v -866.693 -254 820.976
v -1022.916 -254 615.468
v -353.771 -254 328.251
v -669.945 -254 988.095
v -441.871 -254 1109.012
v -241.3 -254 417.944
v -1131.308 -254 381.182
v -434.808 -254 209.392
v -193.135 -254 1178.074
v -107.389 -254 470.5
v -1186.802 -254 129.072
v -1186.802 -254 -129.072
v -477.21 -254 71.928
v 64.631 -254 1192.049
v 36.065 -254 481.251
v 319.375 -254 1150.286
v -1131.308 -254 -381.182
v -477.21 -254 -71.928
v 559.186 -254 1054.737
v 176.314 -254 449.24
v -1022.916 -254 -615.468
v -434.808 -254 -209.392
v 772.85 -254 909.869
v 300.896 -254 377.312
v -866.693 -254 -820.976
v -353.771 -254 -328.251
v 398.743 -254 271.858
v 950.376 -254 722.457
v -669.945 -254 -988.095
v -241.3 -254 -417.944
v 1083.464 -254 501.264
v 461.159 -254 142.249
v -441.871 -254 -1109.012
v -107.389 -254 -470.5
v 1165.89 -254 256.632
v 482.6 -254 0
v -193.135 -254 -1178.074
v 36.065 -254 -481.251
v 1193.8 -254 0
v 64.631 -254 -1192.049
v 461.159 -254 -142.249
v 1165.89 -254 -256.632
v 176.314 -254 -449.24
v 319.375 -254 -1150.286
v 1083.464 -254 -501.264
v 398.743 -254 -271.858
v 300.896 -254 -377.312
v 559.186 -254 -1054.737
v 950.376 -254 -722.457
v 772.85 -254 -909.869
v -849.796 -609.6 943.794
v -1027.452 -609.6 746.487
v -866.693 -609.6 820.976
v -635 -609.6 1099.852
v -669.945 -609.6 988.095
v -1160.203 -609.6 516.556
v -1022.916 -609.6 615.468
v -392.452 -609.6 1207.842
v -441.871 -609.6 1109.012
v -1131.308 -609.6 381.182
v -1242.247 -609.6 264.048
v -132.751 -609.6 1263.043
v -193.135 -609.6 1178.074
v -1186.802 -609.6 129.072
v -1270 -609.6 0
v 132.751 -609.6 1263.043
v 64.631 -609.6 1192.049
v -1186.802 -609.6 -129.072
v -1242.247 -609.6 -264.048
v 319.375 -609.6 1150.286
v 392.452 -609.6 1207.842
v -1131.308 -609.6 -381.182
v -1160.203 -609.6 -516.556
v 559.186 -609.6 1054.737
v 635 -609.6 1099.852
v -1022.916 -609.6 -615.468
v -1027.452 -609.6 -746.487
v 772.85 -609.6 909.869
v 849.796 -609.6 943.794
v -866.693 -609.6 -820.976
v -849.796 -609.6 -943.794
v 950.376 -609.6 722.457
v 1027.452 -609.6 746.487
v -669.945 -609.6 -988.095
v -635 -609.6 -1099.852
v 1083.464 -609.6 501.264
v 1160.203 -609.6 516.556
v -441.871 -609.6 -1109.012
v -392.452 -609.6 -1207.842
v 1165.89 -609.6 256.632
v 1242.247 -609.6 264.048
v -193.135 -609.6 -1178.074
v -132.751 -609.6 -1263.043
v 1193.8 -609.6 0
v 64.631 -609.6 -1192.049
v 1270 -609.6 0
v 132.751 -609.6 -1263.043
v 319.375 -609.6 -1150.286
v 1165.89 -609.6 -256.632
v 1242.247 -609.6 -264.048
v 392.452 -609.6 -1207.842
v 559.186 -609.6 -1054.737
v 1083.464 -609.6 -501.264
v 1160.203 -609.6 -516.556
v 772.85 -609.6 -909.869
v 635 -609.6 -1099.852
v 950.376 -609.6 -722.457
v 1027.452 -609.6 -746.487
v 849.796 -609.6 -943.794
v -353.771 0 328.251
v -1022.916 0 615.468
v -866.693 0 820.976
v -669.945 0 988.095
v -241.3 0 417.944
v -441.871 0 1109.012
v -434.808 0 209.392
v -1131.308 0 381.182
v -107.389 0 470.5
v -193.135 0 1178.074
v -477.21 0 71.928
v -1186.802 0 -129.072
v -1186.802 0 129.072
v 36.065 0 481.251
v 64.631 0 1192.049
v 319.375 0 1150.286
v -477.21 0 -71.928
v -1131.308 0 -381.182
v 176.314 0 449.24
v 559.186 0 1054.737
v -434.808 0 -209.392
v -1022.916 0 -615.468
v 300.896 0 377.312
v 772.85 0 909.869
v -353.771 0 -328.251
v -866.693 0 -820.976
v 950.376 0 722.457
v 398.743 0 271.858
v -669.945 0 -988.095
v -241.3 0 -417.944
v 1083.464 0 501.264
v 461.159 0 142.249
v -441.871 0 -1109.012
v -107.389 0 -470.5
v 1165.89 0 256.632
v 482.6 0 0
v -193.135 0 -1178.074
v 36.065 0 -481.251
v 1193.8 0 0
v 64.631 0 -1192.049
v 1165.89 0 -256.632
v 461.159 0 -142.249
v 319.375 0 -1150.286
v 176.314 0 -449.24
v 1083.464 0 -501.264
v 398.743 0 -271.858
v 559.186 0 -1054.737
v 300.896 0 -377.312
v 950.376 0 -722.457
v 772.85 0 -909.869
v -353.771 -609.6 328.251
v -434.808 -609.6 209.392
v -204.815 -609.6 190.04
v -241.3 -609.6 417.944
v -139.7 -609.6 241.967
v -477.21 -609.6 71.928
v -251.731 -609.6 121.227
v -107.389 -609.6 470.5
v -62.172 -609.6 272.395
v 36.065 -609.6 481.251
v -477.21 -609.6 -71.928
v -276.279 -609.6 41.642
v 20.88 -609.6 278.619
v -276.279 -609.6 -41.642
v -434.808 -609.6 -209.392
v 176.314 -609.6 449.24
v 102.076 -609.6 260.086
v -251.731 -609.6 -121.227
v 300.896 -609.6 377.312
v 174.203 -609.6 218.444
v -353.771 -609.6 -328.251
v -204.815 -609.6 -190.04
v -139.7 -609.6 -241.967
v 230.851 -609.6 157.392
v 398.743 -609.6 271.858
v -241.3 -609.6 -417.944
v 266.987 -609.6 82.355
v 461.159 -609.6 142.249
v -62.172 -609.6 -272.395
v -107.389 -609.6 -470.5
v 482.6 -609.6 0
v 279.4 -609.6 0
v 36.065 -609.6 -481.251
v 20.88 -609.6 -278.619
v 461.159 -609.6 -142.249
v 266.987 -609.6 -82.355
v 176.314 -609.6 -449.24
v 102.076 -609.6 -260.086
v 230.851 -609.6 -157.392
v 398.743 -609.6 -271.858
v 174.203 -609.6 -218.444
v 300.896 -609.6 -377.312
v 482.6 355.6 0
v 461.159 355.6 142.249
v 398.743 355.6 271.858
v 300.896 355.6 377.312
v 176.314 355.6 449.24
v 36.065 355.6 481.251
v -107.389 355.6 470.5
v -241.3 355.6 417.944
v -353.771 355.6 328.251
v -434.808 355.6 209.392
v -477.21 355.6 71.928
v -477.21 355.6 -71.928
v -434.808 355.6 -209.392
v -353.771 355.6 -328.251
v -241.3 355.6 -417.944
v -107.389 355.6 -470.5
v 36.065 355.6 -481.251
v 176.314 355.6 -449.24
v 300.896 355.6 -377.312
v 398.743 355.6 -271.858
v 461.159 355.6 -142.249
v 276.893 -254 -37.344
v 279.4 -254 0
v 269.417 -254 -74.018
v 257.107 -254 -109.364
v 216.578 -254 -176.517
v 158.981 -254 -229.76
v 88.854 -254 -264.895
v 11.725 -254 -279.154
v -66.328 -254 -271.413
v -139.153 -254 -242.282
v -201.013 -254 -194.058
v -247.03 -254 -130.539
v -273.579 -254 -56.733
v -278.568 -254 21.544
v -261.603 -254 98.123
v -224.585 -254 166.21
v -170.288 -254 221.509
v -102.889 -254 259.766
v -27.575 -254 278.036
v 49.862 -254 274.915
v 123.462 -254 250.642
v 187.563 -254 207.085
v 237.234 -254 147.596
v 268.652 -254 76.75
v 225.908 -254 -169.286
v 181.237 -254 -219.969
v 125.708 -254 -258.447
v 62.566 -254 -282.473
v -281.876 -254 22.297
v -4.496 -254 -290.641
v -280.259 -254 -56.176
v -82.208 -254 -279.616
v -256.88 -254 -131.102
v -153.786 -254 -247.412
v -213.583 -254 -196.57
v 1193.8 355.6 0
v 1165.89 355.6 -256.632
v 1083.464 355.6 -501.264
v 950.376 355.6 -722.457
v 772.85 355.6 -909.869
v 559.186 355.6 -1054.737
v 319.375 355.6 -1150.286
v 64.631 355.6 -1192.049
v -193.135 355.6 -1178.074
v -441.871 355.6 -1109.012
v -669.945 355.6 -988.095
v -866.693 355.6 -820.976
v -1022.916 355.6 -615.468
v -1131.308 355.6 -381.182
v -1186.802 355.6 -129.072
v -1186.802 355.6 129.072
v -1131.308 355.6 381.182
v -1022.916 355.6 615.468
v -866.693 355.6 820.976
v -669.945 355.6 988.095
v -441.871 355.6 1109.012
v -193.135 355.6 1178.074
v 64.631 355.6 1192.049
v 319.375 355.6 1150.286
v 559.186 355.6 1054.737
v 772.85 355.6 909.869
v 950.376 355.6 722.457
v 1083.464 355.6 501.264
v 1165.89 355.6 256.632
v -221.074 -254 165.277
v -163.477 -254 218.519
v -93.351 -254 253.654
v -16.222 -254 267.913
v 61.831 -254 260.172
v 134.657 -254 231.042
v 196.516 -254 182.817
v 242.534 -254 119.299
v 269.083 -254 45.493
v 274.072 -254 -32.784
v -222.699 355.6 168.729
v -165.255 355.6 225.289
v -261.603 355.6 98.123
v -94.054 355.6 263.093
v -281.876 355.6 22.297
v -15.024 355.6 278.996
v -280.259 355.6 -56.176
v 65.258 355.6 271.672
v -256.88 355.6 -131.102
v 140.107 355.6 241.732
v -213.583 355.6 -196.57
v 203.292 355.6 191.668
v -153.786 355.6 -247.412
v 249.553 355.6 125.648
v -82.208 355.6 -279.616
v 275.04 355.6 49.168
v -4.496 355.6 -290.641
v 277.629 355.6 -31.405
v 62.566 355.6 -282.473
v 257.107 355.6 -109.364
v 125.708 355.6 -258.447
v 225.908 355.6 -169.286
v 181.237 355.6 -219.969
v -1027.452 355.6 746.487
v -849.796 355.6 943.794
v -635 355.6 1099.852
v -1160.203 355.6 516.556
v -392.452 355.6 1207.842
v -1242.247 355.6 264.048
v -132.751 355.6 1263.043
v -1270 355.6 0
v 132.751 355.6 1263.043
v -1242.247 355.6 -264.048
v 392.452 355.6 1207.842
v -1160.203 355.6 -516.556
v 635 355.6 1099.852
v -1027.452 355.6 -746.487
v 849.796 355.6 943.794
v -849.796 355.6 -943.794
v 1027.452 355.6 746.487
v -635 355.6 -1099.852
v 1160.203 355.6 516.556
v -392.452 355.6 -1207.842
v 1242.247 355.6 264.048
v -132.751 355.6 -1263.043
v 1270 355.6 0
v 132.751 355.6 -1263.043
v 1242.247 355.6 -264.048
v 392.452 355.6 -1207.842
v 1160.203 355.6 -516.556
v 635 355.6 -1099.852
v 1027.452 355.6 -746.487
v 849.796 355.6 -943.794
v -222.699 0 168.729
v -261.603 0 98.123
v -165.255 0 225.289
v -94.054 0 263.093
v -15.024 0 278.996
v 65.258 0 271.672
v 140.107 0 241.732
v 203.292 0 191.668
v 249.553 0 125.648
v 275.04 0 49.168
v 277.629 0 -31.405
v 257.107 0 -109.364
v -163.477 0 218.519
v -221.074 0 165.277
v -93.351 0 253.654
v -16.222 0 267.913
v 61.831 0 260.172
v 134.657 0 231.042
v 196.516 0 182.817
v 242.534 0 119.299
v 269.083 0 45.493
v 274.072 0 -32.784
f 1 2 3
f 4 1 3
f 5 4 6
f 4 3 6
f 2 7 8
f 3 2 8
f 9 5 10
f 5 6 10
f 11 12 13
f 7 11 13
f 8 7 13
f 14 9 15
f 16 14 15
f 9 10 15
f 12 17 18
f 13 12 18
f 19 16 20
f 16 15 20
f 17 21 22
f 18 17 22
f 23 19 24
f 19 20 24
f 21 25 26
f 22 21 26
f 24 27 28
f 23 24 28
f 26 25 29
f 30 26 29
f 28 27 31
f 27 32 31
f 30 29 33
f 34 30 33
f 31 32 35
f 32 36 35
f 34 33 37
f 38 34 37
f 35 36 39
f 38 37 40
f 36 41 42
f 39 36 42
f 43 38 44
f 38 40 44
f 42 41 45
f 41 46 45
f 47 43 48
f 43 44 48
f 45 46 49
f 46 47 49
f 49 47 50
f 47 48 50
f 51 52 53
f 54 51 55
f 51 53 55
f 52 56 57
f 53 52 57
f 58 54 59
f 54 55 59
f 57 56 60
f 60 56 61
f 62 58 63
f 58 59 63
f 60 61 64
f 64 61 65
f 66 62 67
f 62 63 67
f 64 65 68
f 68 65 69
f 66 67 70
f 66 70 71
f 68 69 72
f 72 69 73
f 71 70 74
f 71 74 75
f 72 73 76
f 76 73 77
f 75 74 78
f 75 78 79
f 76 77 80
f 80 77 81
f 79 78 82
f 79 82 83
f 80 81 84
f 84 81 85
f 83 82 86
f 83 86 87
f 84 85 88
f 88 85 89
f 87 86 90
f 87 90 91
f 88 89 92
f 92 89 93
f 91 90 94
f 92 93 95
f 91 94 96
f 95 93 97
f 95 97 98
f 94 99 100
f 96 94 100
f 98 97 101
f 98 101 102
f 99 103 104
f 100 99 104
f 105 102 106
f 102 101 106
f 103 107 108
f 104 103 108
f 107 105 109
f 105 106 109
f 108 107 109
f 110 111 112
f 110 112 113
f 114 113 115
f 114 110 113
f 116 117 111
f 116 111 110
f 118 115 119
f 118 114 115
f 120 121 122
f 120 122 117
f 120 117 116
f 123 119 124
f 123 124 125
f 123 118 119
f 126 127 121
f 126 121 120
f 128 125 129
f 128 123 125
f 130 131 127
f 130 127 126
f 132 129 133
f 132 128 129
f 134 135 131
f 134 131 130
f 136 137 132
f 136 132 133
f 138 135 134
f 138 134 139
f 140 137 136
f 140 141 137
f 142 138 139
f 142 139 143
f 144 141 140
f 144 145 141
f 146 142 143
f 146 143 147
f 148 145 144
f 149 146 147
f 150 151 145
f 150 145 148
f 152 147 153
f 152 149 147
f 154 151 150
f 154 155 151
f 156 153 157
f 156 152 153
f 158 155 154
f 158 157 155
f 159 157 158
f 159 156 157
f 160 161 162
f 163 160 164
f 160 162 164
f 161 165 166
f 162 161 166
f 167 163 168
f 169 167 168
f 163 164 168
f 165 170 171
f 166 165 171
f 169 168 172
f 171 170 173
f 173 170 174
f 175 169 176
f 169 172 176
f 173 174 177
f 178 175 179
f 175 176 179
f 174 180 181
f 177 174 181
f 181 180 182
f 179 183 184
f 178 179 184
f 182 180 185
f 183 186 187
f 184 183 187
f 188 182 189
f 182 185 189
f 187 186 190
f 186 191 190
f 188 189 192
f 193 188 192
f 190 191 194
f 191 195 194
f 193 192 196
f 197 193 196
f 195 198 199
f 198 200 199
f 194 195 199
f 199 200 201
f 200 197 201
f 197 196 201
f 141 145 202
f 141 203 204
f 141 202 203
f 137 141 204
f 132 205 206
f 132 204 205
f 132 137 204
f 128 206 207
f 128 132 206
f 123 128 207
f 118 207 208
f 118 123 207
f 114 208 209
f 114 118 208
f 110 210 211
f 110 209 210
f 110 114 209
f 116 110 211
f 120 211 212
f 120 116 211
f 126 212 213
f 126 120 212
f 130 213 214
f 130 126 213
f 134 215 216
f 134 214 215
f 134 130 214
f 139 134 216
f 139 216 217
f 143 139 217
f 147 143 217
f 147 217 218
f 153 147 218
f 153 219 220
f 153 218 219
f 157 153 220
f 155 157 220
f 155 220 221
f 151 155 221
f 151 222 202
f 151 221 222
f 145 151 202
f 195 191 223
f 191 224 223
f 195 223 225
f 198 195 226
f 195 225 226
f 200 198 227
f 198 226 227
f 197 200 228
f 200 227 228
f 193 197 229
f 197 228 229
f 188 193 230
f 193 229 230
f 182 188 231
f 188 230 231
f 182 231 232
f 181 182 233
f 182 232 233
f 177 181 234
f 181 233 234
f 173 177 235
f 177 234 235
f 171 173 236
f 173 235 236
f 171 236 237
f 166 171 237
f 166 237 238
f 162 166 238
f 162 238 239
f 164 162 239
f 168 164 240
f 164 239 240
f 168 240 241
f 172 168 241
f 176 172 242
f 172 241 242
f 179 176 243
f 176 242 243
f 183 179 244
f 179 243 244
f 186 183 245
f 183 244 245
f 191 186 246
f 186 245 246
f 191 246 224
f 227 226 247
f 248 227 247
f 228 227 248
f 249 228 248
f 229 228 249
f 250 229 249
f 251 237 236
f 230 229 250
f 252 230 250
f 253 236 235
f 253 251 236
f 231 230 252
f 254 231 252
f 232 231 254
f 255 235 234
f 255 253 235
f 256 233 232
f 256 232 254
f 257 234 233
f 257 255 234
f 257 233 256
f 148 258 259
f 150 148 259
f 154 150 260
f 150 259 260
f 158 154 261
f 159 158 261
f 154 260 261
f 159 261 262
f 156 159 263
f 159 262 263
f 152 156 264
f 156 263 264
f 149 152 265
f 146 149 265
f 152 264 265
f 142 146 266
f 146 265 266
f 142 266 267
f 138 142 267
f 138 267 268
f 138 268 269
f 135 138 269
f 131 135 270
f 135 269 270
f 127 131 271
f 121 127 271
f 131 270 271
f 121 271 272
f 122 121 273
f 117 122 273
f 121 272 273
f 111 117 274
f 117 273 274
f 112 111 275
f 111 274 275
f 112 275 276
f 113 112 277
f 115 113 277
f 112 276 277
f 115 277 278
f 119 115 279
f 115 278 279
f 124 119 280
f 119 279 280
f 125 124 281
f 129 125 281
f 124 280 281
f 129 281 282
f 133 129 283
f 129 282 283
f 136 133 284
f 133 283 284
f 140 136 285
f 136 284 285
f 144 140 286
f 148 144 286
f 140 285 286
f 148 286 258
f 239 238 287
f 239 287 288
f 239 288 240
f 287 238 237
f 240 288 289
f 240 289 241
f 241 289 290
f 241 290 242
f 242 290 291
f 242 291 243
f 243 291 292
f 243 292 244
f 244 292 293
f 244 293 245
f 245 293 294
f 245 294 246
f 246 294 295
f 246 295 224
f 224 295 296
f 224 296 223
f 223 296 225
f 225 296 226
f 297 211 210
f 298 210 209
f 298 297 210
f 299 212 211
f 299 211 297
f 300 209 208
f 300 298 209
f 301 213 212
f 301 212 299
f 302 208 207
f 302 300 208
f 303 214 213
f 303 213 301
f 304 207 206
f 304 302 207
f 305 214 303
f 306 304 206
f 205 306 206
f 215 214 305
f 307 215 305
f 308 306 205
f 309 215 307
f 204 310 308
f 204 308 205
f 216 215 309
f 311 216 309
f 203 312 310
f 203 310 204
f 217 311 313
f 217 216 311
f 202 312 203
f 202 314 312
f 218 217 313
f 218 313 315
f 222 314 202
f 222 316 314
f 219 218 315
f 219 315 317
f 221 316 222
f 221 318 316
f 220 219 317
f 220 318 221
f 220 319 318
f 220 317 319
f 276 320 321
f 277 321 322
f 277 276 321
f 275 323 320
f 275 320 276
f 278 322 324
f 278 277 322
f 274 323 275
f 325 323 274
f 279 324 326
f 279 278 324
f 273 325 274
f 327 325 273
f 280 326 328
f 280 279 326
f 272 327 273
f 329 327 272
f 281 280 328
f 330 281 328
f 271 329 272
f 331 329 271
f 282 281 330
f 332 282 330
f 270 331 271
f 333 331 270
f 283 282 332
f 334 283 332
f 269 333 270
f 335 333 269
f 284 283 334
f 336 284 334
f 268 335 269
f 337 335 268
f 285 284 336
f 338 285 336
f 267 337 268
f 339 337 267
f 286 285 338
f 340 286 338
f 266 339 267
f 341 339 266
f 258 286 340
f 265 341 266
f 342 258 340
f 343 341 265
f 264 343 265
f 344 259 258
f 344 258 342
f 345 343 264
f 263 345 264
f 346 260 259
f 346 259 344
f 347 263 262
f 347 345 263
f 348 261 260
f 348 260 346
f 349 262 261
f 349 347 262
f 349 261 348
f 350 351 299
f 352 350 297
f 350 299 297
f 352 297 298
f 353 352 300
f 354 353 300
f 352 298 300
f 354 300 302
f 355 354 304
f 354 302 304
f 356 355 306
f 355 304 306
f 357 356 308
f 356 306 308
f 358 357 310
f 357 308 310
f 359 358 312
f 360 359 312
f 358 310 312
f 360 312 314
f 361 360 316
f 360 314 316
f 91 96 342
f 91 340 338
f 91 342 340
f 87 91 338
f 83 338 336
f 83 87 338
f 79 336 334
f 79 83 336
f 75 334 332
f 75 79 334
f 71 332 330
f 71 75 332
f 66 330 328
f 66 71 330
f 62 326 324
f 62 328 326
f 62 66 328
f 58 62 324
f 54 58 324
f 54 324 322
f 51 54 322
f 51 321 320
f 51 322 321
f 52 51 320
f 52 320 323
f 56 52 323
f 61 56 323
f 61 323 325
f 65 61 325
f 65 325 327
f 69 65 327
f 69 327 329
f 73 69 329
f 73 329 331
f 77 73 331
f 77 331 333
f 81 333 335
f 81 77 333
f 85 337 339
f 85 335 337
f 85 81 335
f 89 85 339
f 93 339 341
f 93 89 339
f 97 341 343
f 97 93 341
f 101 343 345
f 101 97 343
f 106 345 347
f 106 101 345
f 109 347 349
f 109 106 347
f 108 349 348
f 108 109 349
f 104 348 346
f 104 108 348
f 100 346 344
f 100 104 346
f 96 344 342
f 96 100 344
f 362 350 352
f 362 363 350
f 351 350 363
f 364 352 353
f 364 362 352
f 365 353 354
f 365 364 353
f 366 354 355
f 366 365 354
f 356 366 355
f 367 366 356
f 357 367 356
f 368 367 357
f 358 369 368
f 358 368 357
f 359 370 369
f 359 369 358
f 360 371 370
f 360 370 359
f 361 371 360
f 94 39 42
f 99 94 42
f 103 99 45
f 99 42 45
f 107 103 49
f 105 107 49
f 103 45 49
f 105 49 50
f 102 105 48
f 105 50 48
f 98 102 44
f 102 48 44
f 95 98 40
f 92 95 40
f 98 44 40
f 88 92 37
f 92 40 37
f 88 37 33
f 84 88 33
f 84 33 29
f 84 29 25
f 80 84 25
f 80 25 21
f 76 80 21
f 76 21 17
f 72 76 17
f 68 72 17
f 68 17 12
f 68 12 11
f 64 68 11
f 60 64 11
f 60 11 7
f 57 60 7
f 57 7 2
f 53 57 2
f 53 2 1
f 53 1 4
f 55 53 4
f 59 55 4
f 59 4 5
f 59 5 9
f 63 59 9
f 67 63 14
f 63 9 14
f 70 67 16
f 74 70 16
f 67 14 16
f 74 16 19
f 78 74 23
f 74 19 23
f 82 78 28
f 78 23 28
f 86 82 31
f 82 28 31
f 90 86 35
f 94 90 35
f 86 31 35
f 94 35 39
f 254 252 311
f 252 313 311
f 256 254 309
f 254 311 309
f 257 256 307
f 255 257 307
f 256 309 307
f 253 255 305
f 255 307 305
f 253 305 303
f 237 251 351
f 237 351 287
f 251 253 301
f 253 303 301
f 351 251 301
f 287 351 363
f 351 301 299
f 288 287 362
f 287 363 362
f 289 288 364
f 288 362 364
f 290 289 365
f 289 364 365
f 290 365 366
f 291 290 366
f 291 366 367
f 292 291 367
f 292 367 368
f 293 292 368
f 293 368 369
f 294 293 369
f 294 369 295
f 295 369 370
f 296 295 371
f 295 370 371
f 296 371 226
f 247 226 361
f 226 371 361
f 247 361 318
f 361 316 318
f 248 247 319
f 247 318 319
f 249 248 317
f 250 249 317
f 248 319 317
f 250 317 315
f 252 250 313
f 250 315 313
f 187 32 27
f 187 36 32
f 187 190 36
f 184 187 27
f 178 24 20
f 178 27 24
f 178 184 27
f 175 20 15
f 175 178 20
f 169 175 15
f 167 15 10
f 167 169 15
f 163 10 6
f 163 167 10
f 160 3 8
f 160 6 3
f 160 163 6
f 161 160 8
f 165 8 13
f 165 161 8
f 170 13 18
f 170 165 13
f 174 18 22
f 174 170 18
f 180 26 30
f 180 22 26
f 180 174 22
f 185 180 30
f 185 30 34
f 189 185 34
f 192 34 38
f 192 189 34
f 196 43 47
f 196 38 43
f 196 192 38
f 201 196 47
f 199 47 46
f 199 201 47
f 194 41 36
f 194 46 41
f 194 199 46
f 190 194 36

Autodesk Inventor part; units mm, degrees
ref_plane "YZ Plane" through (0, 0, 0) normal (1, 0, 0) x (0, 1, 0)
ref_plane "XZ Plane" through (0, 0, 0) normal (0, 1, 0) x (-1, 0, 0)
ref_plane "XY Plane" through (0, 0, 0) normal (0, 0, 1) x (1, 0, 0)
sketch "Sketch1" plane through (0, 0, 0) normal (0, 0, 1) x (1, 0, 0)
  line L0 (0, 0) -> (279.4, 0)
  line L1 (279.4, 0) -> (279.4, 355.6)
  line L2 (279.4, 355.6) -> (482.6, 355.6)
  line L3 (482.6, 355.6) -> (482.6, 0)
  line L4 (482.6, 0) -> (1193.8, 0)
  line L5 (1193.8, 0) -> (1193.8, 355.6)
  line L6 (1193.8, 355.6) -> (1270, 355.6)
  line L7 (1270, 355.6) -> (1270, 0)
  line L8 (1270, 0) -> (1270, -609.6)
  line L9 (1270, 0) -> (1879.6, 0) construction
  line L10 (1270, -609.6) -> (1193.8, -609.6)
  line L11 (1193.8, -609.6) -> (1193.8, -254)
  line L12 (1193.8, -254) -> (482.6, -254)
  line L13 (482.6, -254) -> (482.6, -609.6)
  line L14 (482.6, -609.6) -> (279.4, -609.6)
  line L15 (279.4, -609.6) -> (279.4, -254)
  line L16 (279.4, -254) -> (0, -254)
  line L17 (0, -254) -> (0, 0)
  dimension "d0" = 279.4
  dimension "d1" = 355.6
  dimension "d2" = 203.2
  dimension "d3" = 711.2
  dimension "d4" = 355.6
  dimension "d5" = 76.2
  dimension "d6" = 609.6
  dimension "d7" = 90
  dimension "d8" = 76.2
  dimension "d9" = 355.6
  dimension "d10" = 355.6
  dimension "d11" = 203.2
  dimension "d12" = 355.6
revolve "Revolution1" add sketch "Sketch1" angle 360 about axis through (0, -254, 0) along (0, 1, 0)
sketch "Sketch2" plane through (0, -254, 0) normal (0, -1, 0) x (1, 0, 0)
  point P0 (0, 0)
  point P1 (-4.4963, -11.2406)
hole "Hole1" at (-4.4963, -254, -11.2406) direction (0, 1, 0) diameter 558.8 end through all
properties part number "Wheel"
